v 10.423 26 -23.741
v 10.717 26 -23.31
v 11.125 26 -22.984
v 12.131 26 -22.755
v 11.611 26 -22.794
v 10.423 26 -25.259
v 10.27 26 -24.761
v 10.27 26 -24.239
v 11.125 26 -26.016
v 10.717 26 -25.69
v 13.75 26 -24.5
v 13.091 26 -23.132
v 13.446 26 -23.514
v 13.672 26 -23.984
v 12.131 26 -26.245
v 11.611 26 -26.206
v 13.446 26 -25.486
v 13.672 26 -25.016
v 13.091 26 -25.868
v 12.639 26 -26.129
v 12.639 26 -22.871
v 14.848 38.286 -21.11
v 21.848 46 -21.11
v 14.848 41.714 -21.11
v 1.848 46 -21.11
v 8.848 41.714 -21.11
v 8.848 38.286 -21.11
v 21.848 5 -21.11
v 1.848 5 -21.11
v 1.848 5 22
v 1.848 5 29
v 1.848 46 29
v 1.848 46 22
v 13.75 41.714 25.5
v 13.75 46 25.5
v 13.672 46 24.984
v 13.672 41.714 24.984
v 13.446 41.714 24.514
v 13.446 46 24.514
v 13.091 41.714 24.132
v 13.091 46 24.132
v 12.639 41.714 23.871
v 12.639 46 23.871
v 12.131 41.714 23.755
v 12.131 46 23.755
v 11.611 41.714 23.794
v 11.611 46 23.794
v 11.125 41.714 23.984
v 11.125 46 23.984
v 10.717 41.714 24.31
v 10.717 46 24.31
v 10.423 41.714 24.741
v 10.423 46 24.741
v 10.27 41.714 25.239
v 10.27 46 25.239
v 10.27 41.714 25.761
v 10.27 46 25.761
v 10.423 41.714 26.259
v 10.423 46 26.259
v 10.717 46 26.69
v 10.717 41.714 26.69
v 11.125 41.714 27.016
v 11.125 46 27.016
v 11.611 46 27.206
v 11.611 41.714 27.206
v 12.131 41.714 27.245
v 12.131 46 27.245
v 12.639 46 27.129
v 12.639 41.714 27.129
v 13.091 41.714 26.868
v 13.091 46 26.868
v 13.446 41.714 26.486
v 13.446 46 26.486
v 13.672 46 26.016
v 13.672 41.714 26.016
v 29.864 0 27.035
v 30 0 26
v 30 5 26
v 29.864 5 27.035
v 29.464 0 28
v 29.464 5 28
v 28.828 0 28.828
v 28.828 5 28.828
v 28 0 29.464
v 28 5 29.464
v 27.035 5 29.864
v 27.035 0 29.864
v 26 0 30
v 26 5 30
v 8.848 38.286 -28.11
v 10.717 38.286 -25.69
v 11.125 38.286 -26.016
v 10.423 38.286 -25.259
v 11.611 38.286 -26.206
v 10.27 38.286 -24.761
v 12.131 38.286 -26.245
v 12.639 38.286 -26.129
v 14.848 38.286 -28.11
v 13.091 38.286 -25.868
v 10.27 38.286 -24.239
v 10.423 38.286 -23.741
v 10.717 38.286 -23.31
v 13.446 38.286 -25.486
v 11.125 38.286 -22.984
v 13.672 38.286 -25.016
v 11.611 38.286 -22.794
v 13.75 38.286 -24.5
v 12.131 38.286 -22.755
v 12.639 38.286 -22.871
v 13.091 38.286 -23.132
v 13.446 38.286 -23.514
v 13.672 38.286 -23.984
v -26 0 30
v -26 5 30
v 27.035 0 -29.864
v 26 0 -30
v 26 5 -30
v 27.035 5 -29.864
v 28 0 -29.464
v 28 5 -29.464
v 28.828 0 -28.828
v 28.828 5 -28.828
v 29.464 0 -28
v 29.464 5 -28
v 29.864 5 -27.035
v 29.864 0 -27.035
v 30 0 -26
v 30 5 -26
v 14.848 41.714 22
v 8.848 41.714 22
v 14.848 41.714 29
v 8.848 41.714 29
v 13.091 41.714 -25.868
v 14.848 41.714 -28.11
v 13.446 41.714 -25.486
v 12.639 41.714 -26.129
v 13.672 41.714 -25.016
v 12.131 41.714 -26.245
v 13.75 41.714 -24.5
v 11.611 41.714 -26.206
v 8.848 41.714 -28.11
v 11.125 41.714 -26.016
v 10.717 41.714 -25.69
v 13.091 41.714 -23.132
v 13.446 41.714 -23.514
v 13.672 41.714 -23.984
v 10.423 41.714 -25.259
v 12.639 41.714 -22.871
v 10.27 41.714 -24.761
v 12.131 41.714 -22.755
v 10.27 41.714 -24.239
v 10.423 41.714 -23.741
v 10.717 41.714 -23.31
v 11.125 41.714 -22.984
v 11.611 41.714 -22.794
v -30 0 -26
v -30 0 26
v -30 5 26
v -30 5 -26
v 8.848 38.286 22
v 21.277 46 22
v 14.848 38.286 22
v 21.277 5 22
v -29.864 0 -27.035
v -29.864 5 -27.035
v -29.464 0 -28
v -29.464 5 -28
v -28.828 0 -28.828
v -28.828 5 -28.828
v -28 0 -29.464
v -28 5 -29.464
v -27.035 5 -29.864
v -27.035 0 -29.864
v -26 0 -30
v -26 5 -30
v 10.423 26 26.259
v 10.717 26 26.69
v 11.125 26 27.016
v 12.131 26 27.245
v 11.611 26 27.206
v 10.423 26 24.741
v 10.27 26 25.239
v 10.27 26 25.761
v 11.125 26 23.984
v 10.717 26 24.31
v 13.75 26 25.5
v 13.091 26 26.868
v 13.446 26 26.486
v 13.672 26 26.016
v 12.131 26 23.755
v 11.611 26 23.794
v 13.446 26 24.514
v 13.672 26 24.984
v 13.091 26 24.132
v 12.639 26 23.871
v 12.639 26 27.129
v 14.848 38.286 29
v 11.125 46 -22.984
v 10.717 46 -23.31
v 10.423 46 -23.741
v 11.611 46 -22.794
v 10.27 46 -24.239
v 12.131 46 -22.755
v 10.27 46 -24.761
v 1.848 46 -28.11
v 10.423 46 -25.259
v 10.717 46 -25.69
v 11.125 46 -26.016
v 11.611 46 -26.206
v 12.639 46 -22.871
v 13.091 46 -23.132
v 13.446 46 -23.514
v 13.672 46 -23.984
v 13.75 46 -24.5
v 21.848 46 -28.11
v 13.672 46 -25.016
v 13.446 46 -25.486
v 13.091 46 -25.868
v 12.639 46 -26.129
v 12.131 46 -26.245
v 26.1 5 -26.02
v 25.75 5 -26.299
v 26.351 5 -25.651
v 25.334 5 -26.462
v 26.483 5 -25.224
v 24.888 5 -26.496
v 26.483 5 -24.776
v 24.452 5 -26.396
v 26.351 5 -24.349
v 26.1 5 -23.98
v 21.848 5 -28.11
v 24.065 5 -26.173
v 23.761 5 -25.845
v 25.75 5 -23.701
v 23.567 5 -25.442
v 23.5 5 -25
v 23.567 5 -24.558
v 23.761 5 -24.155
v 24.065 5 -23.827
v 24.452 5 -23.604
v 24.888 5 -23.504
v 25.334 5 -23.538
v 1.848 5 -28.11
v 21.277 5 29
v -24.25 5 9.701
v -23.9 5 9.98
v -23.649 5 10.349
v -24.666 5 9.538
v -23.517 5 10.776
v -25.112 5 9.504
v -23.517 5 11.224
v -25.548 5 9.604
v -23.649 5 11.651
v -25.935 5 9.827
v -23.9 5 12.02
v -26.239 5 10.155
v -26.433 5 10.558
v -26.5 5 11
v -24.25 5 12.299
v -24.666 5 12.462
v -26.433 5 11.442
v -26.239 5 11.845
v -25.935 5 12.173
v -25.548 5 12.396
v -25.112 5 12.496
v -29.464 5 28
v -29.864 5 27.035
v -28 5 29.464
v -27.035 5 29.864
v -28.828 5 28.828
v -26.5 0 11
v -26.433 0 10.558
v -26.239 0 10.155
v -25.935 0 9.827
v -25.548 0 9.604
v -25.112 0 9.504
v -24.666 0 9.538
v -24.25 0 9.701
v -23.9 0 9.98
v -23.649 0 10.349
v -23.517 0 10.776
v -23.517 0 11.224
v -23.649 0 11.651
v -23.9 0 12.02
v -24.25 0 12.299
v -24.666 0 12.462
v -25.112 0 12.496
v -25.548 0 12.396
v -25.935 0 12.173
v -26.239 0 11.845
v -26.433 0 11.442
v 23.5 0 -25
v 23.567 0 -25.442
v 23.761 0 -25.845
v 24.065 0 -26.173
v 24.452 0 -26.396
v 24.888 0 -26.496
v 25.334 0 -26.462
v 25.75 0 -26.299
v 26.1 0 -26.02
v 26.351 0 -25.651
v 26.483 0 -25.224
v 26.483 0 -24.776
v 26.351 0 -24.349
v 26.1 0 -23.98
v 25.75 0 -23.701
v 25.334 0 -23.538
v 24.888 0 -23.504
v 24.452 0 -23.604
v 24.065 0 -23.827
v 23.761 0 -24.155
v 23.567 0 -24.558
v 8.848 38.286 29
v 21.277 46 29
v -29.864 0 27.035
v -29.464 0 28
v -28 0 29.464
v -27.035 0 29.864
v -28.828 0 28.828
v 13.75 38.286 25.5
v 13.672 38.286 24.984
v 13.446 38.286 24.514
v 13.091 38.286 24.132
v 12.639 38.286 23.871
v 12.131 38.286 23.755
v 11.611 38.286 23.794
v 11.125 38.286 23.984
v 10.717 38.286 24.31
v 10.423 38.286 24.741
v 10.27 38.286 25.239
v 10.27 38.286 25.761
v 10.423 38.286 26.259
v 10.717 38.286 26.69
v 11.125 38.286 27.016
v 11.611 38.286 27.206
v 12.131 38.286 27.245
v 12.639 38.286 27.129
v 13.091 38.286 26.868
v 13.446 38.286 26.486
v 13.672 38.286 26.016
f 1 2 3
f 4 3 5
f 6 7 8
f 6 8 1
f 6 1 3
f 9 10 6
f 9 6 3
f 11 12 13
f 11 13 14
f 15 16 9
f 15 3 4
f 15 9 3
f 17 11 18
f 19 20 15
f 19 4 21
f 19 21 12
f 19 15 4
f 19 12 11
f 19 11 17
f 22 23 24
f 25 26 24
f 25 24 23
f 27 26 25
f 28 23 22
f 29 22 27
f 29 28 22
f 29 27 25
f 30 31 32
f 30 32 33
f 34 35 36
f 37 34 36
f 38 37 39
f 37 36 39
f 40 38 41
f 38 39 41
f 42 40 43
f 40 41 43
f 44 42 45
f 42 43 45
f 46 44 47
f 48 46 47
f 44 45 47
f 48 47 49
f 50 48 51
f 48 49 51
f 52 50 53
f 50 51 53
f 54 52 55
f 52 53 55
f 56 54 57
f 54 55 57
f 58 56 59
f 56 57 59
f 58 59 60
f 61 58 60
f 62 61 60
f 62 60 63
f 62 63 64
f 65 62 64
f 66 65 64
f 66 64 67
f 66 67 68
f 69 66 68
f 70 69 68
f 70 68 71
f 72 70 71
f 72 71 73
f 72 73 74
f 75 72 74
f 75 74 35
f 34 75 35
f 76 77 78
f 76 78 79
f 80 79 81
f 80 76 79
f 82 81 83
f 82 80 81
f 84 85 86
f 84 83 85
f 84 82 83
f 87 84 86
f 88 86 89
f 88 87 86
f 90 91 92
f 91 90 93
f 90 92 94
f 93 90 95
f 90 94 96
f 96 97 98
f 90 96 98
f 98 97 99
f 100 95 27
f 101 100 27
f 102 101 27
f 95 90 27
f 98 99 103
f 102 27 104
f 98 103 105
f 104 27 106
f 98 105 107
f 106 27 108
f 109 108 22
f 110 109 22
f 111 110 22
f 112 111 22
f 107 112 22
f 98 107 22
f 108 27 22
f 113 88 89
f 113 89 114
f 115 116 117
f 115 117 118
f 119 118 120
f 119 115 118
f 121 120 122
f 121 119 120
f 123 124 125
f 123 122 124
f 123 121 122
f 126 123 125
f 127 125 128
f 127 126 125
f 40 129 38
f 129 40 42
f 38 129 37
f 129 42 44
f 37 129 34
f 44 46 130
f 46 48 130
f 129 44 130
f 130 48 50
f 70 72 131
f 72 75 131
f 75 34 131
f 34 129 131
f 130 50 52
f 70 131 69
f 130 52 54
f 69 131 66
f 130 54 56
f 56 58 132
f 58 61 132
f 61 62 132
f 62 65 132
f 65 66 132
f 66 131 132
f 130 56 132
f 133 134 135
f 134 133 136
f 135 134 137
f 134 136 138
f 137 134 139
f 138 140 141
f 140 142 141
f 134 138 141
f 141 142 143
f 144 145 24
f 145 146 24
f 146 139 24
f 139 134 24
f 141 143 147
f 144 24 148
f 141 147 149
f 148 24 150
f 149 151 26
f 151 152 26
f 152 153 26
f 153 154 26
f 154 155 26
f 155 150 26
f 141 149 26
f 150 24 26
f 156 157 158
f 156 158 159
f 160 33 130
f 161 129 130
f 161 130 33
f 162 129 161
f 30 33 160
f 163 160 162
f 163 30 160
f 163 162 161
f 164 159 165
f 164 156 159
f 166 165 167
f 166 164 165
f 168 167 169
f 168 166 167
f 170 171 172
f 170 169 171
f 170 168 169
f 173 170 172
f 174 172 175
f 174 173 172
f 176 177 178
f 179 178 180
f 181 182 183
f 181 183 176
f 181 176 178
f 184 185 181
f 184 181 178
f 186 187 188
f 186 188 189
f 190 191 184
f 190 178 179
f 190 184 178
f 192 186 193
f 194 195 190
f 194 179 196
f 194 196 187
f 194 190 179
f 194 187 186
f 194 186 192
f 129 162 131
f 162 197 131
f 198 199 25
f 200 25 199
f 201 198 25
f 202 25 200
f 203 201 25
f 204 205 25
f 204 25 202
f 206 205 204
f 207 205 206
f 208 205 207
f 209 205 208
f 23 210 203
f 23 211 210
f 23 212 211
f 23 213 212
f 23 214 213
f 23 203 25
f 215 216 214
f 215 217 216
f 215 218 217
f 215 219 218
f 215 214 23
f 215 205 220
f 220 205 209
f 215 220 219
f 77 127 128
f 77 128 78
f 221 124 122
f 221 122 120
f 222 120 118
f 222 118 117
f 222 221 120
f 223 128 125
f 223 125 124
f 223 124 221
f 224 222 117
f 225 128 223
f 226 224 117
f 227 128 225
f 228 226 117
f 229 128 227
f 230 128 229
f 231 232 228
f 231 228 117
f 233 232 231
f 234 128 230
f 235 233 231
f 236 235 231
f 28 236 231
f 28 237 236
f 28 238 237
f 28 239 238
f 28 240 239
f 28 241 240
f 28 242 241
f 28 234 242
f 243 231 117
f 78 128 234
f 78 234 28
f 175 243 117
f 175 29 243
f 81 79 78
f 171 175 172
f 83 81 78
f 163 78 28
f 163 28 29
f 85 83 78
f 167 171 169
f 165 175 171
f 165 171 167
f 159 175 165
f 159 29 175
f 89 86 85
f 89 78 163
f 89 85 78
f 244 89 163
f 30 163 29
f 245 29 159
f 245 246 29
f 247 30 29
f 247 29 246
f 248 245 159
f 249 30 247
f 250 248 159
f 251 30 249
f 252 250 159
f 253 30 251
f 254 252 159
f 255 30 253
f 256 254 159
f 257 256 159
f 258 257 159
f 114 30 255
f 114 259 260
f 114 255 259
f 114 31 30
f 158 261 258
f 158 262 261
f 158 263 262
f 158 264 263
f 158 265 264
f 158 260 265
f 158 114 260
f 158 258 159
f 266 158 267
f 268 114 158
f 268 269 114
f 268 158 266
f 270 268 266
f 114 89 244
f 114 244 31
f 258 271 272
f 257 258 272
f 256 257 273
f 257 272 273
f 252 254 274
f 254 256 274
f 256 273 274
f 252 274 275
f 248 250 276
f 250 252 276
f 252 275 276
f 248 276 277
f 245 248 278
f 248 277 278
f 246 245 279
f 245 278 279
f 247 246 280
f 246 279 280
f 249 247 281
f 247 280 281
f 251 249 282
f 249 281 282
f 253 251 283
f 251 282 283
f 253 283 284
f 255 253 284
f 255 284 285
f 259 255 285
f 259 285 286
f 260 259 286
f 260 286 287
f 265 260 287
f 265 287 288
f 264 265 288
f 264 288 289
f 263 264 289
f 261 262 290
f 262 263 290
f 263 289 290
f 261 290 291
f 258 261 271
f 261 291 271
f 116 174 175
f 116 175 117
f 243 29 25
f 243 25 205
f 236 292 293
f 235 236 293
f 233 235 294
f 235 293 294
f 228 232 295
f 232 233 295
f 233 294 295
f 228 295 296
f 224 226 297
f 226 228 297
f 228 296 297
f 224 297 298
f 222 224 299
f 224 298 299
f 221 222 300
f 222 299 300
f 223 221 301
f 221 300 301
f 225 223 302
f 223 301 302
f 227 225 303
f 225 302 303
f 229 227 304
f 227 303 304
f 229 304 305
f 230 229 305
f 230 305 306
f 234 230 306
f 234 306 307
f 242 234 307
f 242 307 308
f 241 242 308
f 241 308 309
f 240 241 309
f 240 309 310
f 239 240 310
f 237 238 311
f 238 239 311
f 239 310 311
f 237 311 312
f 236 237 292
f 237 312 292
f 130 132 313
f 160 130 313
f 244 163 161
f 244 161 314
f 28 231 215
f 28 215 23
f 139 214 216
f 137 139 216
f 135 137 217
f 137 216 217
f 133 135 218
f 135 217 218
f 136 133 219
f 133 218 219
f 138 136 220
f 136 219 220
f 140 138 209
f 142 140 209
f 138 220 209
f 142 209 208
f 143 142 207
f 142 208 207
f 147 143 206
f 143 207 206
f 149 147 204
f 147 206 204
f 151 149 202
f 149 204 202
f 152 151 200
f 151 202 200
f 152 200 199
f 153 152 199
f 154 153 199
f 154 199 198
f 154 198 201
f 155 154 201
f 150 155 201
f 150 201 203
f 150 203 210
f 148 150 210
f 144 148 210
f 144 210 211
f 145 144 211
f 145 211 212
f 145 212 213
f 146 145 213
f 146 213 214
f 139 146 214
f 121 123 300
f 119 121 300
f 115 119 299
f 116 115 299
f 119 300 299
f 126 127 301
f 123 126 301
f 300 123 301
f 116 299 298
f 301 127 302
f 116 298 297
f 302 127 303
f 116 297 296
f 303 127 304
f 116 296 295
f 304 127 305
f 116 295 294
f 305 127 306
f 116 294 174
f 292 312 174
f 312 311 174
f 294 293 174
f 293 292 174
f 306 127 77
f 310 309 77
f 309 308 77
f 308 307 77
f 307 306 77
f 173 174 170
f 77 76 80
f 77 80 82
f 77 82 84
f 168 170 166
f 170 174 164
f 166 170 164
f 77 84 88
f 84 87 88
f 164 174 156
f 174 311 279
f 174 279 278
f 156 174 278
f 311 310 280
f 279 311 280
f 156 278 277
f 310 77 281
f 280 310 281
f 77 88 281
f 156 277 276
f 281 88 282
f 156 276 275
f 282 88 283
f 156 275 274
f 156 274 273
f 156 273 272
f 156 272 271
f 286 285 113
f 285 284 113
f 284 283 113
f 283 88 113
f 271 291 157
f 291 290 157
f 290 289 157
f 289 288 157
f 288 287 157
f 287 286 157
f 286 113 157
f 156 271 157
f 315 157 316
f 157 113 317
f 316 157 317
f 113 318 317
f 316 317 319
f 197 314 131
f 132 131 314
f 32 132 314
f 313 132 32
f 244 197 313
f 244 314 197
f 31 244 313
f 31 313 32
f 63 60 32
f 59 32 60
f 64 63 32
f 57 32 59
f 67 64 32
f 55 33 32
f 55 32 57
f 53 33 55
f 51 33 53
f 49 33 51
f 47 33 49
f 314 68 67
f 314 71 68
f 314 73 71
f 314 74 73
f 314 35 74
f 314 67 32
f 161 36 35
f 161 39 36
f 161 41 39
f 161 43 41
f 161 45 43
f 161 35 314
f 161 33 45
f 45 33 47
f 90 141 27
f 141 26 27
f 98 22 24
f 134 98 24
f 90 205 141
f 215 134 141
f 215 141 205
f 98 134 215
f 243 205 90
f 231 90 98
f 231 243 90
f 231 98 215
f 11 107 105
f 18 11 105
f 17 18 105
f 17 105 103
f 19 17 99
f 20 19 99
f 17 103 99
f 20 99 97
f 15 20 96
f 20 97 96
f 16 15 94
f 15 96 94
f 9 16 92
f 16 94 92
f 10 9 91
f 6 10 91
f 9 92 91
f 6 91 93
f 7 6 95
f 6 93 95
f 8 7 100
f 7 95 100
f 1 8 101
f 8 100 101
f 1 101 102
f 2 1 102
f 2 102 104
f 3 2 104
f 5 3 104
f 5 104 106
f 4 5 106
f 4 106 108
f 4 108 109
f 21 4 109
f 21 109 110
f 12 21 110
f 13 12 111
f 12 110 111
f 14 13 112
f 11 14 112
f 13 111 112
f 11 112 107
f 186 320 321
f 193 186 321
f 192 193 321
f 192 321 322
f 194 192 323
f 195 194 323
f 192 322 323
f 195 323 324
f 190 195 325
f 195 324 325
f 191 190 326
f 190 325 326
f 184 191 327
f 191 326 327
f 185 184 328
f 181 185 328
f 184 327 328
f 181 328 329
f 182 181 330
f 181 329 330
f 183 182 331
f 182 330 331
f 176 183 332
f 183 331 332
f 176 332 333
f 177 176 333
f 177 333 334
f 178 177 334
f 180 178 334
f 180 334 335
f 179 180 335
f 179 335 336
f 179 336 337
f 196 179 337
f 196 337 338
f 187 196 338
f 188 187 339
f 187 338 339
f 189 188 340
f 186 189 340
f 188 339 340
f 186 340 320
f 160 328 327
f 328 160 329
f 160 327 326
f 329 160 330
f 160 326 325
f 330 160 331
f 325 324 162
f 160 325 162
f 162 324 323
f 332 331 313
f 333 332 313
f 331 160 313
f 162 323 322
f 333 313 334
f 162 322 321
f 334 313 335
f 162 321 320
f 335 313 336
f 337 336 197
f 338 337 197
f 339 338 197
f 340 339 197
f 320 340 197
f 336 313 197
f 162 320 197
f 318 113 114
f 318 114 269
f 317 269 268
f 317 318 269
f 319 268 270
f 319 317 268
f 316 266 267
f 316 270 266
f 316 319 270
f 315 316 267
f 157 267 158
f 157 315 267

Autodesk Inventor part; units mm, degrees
ref_plane "YZ Plane" through (0, 0, 0) normal (1, 0, 0) x (0, 1, 0)
ref_plane "XZ Plane" through (0, 0, 0) normal (0, 1, 0) x (-1, 0, 0)
ref_plane "XY Plane" through (0, 0, 0) normal (0, 0, 1) x (1, 0, 0)
sketch "Szkic1" plane through (0, 0, 0) normal (0, 1, 0) x (-1, 0, 0)
  line L0 (-26, 30) -> (26, 30)
  line L1 (30, 26) -> (30, -26)
  line L2 (26, -30) -> (-26, -30)
  line L3 (-30, -26) -> (-30, 26)
  line L4 (-30, 30) -> (30, -30) construction
  line L5 (30, 30) -> (-30, -30) construction
  circle A0 centre (-25, -25) radius 1.5
  circle A1 centre (25, 11) radius 1.5
  arc A2 (-30, -26) -> (-26, -30) centre (-26, -26) ccw
  arc A3 (-26, 30) -> (-30, 26) centre (-26, 26) ccw
  arc A4 (30, 26) -> (26, 30) centre (26, 26) ccw
  arc A5 (26, -30) -> (30, -26) centre (26, -26) ccw
  point P0 (0, 0)
  dimension "d0" = 60
  dimension "d1" = 60
  dimension "d2" = 3
  dimension "d3" = 3
  dimension "d5" = 4
  dimension "d6" = 4
  dimension "d7" = 4
  dimension "d8" = 4
extrude "Wyciągnięcie proste1" add sketch "Szkic1" along normal blind 5
sketch "Szkic2" plane through (0, 5, 0) normal (0, 1, 0) x (1, 0, 0)
  line L0 (21.8475, 21.1097) -> (1.8475, 21.1097)
  line L1 (1.8475, 21.1097) -> (1.8475, 28.1097)
  line L2 (1.8475, 28.1097) -> (21.8475, 28.1097)
  line L3 (21.8475, 28.1097) -> (21.8475, 21.1097)
  line L4 (1.8475, -22) -> (21.2771, -22)
  line L5 (21.2771, -22) -> (21.2771, -29)
  line L6 (21.2771, -29) -> (1.8475, -29)
  line L7 (1.8475, -29) -> (1.8475, -22)
  point P0 (0, 0)
  dimension "d11" = 20
  dimension "d12" = 7
  dimension "d13" = 7
extrude "Wyciągnięcie proste2" add sketch "Szkic2" along normal blind 41
sketch "Szkic3" plane through (1.8475, 5, 29) normal (0, 0, 1) x (1, 0, 0)
  line L0 (7, 33.2857) -> (13, 33.2857)
  line L1 (13, 33.2857) -> (13, 36.7143)
  line L2 (13, 36.7143) -> (7, 36.7143)
  line L3 (7, 36.7143) -> (7, 33.2857)
  line L4 (7, 33.2857) -> (13, 36.7143) construction
  line L5 (13, 33.2857) -> (7, 36.7143) construction
  point P0 (-1.8475, -5)
  point P1 (10, 35)
  dimension "d16" = 6
  dimension "d17" = 3.4286
sketch "Szkic4" plane through (1.8475, 5, -21.1097) normal (0, 0, 1) x (1, 0, 0)
  line L0 (7, 33.2857) -> (13, 33.2857)
  line L1 (13, 33.2857) -> (13, 36.7143)
  line L2 (13, 36.7143) -> (7, 36.7143)
  line L3 (7, 36.7143) -> (7, 33.2857)
  line L4 (7, 33.2857) -> (13, 36.7143) construction
  line L5 (13, 33.2857) -> (7, 36.7143) construction
  point P0 (-1.8475, -5)
  point P1 (10, 35)
  dimension "d18" = 6
  dimension "d19" = 3.4286
extrude "Wyciągnięcie proste3" cut sketch "Szkic4" against normal blind 7
extrude "Wyciągnięcie proste4" cut sketch "Szkic3" against normal blind 7
sketch "Szkic5" plane through (0, 46, 0) normal (0, 1, 0) x (1, 0, 0)
  circle A0 centre (12, 24.5) radius 1.75
  circle A1 centre (12, -25.5) radius 1.75
  point P0 (0, 0)
  dimension "d24" = 3.5
  dimension "d25" = 3.5
extrude "Wyciągnięcie proste5" cut sketch "Szkic5" against normal blind 20
properties part number "MotorHolder"
